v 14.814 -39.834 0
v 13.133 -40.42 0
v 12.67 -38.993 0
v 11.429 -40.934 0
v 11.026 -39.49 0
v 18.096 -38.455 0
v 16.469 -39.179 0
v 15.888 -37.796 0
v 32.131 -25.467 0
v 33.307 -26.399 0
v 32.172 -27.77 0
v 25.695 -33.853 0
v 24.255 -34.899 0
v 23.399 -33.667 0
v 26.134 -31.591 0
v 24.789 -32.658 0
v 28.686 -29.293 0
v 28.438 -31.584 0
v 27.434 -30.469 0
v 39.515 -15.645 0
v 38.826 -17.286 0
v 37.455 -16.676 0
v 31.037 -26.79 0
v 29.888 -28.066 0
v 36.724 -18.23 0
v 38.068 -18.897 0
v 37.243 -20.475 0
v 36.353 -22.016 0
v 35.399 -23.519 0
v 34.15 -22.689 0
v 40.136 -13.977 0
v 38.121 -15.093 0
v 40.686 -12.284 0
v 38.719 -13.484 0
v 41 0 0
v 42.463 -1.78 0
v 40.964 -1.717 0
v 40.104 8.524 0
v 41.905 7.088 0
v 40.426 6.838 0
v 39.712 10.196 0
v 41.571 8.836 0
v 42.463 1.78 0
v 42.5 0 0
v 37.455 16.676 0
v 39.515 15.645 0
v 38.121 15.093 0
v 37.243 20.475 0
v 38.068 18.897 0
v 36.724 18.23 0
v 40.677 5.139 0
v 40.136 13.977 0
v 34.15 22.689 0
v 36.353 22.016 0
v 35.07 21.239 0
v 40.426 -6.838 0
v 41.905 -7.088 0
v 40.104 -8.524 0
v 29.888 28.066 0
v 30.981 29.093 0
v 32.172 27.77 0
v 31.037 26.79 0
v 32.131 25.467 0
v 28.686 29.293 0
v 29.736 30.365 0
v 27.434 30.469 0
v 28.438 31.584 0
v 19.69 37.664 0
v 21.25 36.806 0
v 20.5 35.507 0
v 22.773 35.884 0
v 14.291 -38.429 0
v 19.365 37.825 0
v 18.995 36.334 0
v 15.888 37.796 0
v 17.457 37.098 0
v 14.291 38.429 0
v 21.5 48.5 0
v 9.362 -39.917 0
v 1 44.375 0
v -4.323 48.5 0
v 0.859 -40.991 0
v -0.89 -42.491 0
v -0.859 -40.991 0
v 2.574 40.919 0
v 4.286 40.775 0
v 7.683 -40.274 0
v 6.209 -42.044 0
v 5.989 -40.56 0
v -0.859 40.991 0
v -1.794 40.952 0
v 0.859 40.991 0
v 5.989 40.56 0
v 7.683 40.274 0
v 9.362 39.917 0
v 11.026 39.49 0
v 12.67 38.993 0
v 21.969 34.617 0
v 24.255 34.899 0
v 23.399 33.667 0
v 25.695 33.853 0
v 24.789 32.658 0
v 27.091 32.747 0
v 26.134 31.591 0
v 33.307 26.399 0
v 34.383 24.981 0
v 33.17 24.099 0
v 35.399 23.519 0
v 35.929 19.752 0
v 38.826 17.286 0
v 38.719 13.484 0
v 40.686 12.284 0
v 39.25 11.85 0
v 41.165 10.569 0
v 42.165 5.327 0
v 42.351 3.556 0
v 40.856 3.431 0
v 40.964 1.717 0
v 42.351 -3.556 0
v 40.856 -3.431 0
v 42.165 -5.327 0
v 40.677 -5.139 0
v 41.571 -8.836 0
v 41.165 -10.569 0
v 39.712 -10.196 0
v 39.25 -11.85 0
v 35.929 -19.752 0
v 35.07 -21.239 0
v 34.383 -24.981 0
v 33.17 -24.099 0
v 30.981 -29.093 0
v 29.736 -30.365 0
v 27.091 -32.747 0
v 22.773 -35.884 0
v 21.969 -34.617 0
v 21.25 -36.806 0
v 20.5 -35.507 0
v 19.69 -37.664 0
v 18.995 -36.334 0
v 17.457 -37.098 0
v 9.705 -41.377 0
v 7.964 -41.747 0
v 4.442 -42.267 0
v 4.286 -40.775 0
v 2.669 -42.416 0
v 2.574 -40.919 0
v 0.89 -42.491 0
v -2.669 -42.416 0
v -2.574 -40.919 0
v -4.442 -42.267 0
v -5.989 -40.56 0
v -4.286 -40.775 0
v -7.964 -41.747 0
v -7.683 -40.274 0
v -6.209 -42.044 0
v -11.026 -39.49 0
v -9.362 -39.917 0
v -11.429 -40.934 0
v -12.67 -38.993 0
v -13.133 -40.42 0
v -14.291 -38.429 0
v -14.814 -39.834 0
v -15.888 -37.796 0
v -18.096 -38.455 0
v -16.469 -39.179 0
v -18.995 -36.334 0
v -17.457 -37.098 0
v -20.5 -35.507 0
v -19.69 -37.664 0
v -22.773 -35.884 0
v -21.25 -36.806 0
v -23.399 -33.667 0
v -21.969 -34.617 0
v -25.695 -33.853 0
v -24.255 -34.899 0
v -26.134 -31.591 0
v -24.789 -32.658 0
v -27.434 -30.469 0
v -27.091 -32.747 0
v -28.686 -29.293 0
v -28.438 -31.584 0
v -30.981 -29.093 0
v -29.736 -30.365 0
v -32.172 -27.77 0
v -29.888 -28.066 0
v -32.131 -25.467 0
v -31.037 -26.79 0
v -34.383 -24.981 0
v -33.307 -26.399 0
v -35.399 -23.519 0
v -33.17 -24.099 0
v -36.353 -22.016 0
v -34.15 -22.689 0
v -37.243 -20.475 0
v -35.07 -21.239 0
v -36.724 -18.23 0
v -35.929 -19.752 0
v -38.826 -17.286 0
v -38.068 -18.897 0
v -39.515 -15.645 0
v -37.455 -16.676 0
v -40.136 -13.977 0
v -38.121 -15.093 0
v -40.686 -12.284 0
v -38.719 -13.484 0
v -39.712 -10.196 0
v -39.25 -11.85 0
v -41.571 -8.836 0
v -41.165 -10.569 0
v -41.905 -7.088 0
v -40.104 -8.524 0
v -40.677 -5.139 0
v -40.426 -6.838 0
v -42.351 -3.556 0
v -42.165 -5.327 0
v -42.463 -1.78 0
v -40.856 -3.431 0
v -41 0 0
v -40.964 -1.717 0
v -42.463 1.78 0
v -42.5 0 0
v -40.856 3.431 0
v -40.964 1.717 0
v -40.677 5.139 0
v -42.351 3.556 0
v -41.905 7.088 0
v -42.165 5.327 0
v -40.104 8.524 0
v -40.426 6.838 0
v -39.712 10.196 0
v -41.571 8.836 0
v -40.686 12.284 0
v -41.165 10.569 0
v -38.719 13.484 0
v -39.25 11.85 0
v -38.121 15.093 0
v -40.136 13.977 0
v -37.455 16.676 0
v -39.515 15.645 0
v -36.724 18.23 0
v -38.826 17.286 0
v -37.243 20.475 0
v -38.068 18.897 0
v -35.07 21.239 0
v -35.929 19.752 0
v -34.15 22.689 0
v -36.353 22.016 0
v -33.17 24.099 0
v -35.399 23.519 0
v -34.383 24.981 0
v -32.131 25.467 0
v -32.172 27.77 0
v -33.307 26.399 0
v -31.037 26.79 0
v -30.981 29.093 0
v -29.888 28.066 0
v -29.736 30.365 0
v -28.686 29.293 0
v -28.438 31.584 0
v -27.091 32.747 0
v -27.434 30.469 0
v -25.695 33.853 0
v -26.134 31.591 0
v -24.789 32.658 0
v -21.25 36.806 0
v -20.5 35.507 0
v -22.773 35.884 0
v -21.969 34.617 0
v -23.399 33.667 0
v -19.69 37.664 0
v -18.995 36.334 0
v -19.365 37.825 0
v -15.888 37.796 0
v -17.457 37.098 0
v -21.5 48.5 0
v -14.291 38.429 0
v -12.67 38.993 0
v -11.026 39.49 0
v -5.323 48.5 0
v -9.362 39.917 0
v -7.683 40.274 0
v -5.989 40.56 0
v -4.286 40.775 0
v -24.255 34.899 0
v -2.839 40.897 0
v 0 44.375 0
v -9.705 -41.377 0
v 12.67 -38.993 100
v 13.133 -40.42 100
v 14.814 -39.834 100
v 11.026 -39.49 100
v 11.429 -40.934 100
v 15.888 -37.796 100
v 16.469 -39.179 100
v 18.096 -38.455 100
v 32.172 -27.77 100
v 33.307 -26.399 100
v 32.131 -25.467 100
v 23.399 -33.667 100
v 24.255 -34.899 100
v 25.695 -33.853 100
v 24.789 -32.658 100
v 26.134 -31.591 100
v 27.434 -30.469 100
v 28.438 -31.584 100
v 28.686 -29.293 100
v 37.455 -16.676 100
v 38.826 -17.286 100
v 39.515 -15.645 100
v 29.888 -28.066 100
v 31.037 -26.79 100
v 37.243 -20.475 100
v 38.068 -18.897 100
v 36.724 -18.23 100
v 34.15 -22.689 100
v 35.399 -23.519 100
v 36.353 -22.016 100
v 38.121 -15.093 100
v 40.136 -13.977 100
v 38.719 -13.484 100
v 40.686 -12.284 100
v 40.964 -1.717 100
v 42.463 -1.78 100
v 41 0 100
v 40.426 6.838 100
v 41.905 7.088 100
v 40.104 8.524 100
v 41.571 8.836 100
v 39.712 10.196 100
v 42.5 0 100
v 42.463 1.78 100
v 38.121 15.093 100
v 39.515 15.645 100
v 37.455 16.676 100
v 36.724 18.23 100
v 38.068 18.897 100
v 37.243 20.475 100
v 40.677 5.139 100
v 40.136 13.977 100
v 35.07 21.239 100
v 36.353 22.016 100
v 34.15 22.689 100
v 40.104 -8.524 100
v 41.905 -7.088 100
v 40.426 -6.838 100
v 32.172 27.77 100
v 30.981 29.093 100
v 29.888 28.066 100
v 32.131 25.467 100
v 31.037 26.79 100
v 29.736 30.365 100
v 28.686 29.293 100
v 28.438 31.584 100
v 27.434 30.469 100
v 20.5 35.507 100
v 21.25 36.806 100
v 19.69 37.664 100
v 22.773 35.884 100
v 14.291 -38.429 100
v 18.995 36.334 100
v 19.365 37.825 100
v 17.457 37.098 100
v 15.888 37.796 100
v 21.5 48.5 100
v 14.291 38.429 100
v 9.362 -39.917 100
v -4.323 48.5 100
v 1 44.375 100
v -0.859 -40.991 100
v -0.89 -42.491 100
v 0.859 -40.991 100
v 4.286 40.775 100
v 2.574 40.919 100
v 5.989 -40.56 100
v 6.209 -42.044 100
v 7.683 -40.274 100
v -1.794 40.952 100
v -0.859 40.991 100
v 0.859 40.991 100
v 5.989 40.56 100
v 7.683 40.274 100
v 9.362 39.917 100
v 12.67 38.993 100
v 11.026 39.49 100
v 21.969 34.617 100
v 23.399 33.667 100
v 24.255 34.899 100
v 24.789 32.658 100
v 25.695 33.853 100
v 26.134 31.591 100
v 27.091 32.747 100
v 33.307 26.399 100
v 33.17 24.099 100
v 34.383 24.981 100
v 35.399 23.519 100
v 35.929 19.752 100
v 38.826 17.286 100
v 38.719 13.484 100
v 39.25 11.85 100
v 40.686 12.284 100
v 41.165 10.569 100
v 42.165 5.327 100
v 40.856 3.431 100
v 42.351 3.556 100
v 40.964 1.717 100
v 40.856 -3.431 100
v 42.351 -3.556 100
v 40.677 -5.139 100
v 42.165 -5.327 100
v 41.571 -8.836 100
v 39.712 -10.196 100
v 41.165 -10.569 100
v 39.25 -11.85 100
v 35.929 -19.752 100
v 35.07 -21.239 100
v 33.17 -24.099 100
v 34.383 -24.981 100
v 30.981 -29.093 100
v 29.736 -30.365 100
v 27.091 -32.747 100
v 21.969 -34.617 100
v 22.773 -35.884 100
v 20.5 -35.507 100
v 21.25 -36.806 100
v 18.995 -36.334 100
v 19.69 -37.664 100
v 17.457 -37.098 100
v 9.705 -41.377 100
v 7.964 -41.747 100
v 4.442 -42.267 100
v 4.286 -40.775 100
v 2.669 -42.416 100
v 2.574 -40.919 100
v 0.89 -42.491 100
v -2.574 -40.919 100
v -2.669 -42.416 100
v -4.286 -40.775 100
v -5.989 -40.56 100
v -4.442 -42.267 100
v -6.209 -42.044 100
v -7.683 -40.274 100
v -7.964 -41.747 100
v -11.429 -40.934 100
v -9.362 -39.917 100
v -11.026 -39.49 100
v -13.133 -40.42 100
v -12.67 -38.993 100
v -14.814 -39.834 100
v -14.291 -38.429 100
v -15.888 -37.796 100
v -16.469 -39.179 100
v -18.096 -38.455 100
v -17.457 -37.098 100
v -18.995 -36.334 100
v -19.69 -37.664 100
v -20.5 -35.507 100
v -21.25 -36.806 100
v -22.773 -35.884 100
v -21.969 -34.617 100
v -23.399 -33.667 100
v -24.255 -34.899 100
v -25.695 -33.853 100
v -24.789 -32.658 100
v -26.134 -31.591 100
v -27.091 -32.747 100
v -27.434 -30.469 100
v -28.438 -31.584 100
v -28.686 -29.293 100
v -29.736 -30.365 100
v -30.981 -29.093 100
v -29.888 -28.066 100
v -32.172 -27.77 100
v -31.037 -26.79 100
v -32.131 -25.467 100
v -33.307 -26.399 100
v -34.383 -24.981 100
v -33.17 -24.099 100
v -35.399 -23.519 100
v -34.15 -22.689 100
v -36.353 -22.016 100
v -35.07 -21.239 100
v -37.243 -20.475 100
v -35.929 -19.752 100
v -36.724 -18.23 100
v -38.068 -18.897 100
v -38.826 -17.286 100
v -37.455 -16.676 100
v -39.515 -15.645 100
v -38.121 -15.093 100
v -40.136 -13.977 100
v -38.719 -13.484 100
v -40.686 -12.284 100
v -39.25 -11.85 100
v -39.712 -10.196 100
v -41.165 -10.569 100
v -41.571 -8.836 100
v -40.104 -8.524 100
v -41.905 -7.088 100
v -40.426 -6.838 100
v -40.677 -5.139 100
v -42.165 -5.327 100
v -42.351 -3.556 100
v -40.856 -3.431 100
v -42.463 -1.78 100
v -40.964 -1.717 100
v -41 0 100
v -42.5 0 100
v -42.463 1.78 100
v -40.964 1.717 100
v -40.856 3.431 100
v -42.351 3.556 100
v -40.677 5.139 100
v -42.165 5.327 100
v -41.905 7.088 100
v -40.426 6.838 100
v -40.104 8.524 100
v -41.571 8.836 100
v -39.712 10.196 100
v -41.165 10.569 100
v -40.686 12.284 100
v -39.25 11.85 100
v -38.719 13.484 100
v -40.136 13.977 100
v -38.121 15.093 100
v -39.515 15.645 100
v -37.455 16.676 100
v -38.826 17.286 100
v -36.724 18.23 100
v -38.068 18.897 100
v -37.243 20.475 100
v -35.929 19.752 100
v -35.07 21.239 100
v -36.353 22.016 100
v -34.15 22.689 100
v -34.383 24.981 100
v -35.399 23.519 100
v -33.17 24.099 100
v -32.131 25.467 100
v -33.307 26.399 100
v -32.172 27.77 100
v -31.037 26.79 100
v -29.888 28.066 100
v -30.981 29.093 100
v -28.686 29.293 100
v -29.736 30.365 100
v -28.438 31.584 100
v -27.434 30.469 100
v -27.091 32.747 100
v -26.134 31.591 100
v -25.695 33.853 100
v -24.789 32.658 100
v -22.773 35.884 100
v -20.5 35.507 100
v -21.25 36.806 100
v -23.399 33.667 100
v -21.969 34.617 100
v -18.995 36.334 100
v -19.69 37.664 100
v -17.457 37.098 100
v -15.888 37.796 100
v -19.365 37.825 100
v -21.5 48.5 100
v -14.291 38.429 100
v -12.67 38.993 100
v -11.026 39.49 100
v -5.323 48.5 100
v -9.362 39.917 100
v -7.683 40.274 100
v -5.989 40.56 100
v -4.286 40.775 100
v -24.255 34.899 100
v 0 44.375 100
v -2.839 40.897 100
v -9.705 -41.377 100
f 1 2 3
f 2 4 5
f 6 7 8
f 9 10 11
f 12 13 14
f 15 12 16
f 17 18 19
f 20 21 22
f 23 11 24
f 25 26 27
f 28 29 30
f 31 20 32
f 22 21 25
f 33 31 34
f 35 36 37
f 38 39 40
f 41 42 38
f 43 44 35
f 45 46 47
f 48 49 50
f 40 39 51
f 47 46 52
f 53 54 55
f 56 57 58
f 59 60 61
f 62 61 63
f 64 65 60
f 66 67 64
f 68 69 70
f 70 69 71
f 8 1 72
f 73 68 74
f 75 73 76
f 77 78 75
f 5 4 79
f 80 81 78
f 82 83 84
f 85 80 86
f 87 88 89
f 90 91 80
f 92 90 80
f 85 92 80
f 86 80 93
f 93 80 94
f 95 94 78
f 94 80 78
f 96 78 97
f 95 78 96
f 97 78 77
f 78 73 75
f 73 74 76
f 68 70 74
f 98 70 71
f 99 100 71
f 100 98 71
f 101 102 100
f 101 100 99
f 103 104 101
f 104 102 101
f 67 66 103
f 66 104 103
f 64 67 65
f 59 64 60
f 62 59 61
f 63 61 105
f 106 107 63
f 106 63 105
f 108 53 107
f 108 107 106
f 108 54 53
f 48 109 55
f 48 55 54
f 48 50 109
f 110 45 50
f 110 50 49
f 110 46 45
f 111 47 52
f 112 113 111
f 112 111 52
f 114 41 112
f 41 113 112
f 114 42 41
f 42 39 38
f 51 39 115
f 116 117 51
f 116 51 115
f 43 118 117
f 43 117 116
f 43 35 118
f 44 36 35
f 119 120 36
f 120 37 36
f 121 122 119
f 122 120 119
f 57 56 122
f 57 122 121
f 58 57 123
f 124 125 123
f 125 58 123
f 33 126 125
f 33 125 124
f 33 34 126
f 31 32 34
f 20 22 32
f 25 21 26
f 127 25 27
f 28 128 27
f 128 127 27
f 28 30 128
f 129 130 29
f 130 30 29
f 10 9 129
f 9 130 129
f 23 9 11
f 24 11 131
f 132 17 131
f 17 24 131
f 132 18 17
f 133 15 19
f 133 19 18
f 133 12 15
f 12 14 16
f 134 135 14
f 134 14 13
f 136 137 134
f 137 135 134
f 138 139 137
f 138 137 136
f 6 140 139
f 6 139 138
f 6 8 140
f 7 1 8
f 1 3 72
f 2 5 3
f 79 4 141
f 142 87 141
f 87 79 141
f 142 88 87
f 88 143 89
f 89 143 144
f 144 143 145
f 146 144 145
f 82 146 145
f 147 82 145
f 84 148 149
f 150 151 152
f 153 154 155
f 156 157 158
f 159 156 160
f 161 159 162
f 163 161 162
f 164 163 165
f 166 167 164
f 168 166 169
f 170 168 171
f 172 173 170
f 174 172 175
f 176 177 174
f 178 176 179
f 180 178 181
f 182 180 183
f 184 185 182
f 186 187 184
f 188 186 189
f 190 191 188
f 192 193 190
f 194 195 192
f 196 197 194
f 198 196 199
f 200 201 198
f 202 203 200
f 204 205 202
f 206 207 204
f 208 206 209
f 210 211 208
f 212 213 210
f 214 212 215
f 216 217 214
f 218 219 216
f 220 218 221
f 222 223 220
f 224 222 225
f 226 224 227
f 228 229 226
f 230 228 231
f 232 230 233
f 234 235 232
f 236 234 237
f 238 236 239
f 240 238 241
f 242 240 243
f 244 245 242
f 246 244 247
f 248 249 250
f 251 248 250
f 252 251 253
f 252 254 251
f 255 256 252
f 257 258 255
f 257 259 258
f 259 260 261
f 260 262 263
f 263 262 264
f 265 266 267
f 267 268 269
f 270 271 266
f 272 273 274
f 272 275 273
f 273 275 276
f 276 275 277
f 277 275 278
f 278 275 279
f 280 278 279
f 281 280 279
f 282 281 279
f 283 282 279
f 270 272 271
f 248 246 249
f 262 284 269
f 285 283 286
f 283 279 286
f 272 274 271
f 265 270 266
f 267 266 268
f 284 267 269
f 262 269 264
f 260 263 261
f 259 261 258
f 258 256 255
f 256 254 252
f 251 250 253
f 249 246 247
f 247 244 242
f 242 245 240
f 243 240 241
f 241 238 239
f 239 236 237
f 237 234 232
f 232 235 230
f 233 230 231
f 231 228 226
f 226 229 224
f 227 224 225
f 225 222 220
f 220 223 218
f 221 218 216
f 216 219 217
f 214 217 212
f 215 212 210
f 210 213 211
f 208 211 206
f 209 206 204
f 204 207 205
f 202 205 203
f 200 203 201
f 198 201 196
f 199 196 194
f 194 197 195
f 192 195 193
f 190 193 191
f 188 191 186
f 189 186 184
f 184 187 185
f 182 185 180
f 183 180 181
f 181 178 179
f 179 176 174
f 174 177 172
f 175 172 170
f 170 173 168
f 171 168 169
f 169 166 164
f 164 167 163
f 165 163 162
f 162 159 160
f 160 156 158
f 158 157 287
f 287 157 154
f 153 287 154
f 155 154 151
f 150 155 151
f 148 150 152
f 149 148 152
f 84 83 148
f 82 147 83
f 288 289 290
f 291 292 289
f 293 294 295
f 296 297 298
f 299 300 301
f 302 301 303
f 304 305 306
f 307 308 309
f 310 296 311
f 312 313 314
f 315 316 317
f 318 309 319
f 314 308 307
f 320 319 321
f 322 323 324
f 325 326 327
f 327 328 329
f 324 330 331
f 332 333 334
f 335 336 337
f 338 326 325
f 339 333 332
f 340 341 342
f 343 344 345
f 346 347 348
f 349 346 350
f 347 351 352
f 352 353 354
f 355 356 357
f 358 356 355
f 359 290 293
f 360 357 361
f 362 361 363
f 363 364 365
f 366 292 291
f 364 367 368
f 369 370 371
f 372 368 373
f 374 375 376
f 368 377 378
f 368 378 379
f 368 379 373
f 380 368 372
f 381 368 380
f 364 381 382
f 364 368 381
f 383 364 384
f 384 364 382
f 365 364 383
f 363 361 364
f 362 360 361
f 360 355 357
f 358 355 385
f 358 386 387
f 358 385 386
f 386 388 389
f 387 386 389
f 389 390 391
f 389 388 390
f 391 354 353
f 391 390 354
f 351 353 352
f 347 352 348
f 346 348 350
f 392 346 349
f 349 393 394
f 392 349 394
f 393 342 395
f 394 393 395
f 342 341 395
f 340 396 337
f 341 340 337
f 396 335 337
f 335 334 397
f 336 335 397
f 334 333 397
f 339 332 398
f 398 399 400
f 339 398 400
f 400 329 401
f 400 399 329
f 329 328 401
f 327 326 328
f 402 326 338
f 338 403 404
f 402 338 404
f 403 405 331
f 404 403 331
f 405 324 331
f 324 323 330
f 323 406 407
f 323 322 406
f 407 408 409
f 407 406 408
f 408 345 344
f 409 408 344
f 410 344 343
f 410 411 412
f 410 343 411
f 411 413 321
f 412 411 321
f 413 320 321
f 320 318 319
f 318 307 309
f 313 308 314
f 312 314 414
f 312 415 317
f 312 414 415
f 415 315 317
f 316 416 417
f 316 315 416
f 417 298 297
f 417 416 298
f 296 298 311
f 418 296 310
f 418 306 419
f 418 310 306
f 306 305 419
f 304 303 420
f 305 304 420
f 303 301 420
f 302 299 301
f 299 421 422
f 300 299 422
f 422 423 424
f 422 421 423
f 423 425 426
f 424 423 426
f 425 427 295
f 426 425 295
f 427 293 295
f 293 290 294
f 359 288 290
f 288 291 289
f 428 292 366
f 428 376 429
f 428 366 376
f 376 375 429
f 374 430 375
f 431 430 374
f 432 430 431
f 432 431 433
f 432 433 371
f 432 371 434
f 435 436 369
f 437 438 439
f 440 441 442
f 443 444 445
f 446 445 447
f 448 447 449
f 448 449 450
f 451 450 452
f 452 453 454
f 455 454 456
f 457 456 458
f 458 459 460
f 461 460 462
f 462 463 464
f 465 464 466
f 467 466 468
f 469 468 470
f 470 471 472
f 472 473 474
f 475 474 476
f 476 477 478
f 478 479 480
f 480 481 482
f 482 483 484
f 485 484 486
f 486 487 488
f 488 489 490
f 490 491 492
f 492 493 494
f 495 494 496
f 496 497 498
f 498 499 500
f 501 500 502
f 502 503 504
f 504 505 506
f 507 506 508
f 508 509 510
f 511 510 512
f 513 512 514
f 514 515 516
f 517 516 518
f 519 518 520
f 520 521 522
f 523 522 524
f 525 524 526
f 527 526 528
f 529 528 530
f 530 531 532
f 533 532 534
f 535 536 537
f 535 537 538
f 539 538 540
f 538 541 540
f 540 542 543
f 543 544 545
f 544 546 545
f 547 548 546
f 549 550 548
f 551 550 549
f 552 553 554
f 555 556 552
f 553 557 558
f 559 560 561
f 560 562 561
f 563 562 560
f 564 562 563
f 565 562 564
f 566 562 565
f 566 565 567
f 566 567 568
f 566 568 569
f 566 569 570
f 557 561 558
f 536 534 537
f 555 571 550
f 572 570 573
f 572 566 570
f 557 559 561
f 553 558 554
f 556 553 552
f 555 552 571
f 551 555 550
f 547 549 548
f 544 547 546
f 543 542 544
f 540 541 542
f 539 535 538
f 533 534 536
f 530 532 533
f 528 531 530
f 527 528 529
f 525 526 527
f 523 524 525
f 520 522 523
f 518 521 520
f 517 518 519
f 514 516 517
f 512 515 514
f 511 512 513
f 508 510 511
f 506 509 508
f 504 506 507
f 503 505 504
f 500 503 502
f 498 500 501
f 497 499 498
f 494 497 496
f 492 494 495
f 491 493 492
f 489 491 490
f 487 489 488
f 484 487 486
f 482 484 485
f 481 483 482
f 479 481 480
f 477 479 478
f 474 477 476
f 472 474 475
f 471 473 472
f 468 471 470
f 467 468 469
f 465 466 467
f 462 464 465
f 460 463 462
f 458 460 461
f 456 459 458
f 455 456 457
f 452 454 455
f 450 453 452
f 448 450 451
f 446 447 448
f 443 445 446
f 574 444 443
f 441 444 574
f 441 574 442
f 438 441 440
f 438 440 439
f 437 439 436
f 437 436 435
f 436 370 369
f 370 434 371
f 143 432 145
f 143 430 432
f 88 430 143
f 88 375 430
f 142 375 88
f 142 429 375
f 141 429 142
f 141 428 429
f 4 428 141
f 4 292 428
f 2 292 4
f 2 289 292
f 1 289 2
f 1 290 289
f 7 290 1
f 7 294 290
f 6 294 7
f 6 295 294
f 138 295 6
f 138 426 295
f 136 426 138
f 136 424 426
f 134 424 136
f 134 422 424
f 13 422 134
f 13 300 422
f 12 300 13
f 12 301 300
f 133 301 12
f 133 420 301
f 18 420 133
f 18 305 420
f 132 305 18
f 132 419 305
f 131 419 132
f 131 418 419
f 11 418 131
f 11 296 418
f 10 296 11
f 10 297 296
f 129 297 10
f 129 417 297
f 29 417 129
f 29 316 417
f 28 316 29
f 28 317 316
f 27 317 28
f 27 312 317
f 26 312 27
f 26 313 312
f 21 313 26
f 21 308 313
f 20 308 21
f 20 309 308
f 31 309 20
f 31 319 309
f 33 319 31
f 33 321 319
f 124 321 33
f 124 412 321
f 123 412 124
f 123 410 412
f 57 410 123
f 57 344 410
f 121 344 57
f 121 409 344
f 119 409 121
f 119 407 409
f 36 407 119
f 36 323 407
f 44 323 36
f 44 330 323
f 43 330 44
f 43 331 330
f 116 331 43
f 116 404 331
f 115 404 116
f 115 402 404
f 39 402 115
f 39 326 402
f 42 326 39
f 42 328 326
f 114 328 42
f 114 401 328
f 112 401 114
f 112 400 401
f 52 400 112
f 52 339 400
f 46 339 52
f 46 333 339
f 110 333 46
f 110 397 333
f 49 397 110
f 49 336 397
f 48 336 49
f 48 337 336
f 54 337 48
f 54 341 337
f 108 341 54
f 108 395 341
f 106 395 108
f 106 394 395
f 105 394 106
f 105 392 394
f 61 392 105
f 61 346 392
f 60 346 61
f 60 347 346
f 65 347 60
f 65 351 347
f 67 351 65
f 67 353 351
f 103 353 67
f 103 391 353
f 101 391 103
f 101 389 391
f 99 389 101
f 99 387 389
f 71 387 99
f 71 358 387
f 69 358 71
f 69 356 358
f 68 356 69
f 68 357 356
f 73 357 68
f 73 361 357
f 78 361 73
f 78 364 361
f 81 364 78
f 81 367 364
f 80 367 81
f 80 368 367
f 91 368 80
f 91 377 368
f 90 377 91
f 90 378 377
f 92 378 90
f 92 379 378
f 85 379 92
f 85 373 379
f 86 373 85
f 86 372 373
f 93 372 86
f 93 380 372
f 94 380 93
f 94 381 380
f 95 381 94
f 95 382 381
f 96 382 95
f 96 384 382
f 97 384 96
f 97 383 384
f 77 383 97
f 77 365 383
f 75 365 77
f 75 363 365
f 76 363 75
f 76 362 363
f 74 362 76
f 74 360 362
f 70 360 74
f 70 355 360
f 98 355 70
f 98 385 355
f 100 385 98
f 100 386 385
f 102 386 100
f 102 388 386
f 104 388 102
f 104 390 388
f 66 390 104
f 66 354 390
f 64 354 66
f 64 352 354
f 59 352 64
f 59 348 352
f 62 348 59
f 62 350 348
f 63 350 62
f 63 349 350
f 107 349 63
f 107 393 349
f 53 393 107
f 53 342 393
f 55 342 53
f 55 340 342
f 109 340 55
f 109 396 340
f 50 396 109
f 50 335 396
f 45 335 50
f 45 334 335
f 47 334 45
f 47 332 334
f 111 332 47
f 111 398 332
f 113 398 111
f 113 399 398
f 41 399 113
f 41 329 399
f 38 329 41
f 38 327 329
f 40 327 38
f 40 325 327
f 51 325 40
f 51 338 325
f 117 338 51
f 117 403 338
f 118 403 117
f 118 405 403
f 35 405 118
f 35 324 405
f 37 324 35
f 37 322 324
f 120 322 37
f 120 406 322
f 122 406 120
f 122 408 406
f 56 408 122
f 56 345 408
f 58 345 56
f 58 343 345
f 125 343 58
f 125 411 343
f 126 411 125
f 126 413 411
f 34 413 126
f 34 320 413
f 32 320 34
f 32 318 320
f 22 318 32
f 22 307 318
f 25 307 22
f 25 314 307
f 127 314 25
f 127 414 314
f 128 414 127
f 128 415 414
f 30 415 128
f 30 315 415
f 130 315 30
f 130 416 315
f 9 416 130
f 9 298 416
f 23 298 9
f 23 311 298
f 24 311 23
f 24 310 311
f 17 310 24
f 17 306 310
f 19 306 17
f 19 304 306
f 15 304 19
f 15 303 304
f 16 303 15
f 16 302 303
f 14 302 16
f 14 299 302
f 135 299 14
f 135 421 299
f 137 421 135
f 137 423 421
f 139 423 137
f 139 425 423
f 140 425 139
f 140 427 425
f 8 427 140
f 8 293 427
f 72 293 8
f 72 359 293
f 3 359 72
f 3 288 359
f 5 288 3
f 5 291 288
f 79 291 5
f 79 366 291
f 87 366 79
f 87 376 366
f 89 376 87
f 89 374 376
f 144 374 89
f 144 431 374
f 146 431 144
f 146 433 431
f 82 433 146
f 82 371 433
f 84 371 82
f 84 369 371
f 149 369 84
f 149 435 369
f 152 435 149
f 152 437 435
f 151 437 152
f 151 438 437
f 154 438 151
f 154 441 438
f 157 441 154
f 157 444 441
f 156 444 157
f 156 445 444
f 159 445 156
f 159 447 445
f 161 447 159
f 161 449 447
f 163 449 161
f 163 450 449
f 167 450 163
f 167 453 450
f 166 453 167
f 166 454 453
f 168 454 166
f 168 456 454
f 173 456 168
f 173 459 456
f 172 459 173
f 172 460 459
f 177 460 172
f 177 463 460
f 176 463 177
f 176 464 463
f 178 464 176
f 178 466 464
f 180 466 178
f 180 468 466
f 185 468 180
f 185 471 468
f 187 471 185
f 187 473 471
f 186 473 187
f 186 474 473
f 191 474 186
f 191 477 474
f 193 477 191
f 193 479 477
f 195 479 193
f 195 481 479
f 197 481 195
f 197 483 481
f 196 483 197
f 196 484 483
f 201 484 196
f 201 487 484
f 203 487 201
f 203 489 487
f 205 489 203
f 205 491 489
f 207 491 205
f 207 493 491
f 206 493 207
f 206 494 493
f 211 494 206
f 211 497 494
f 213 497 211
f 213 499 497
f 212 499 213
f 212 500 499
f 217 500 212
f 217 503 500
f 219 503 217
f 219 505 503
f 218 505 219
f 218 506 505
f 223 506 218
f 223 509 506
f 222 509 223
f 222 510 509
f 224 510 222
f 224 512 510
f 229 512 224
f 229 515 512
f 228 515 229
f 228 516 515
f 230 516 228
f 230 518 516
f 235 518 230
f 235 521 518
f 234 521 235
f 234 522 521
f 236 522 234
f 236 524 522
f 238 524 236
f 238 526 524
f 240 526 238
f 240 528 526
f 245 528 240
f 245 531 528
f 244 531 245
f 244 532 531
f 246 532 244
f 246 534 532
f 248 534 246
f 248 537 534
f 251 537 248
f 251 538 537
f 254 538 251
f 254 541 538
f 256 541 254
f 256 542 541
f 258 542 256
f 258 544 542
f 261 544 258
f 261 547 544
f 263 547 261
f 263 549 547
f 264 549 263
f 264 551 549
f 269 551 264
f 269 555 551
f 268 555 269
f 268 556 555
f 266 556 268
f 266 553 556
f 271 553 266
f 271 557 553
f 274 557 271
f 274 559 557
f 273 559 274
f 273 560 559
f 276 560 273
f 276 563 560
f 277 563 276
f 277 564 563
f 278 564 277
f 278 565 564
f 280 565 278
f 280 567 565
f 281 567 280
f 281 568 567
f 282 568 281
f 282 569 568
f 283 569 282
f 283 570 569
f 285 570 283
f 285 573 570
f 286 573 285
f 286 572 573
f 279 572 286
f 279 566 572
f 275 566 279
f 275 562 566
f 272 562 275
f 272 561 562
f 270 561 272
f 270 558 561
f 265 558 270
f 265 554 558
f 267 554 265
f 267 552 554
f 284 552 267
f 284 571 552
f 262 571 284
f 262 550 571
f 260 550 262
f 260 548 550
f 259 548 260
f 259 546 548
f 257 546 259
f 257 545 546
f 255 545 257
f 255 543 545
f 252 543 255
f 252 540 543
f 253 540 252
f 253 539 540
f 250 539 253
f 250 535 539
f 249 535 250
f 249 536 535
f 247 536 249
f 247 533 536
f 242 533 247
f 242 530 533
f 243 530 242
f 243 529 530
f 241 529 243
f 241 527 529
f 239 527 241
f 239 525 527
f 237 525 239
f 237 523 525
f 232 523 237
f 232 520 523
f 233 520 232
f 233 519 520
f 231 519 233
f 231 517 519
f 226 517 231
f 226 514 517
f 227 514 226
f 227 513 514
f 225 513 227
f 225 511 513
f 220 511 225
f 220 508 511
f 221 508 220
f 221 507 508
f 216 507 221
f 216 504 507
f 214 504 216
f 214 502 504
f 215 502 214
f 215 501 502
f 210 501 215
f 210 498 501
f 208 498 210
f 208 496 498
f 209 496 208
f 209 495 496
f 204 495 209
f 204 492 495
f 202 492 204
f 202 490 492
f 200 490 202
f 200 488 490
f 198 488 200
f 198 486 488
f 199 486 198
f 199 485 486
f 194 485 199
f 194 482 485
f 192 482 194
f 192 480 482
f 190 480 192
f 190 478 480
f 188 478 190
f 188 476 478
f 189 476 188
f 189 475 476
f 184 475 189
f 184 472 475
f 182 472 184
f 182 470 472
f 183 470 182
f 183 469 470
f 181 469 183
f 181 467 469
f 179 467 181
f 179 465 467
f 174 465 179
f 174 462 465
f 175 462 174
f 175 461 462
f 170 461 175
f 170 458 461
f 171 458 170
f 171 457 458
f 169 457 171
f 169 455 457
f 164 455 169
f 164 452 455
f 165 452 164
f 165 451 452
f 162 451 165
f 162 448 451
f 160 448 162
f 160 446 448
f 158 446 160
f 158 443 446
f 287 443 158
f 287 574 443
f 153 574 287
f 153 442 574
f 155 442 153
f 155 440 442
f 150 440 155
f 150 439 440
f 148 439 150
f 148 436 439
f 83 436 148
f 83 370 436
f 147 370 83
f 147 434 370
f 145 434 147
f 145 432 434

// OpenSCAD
$fn = 150;

// cleat dimensions
$c_width = 37;
$c_maj_width = 43;
$c_height = 15;

// tube dimensions
$tube_radius = 82/ 2;
$strap_thick = 1.5;

//cut width
$cut = 1;


linear_extrude(height = 100) {
    difference() {
        union() {
            translate([0, $tube_radius - $c_height / 2, 0])
                polygon([
                        [$c_maj_width / 2, $c_height],
                        [- $c_maj_width / 2, $c_height],
                        [- $c_width / 2, 0],
                        [$c_width / 2,0]
                    ]);
            circle($tube_radius + $strap_thick);
        }
        circle($tube_radius);
        // v bend relief
        polygon([
                [-$c_height, $tube_radius-$c_height],
                [0, $tube_radius+(($c_height-$strap_thick)/4)],
                [-$c_height, $tube_radius+$c_height],

                [-$c_height+$cut, $tube_radius+$c_height],
                [$cut, $tube_radius+(($c_height-$strap_thick)/4)],
                [-$c_height+$cut, $tube_radius-$c_height],
            ]);
    }
}
